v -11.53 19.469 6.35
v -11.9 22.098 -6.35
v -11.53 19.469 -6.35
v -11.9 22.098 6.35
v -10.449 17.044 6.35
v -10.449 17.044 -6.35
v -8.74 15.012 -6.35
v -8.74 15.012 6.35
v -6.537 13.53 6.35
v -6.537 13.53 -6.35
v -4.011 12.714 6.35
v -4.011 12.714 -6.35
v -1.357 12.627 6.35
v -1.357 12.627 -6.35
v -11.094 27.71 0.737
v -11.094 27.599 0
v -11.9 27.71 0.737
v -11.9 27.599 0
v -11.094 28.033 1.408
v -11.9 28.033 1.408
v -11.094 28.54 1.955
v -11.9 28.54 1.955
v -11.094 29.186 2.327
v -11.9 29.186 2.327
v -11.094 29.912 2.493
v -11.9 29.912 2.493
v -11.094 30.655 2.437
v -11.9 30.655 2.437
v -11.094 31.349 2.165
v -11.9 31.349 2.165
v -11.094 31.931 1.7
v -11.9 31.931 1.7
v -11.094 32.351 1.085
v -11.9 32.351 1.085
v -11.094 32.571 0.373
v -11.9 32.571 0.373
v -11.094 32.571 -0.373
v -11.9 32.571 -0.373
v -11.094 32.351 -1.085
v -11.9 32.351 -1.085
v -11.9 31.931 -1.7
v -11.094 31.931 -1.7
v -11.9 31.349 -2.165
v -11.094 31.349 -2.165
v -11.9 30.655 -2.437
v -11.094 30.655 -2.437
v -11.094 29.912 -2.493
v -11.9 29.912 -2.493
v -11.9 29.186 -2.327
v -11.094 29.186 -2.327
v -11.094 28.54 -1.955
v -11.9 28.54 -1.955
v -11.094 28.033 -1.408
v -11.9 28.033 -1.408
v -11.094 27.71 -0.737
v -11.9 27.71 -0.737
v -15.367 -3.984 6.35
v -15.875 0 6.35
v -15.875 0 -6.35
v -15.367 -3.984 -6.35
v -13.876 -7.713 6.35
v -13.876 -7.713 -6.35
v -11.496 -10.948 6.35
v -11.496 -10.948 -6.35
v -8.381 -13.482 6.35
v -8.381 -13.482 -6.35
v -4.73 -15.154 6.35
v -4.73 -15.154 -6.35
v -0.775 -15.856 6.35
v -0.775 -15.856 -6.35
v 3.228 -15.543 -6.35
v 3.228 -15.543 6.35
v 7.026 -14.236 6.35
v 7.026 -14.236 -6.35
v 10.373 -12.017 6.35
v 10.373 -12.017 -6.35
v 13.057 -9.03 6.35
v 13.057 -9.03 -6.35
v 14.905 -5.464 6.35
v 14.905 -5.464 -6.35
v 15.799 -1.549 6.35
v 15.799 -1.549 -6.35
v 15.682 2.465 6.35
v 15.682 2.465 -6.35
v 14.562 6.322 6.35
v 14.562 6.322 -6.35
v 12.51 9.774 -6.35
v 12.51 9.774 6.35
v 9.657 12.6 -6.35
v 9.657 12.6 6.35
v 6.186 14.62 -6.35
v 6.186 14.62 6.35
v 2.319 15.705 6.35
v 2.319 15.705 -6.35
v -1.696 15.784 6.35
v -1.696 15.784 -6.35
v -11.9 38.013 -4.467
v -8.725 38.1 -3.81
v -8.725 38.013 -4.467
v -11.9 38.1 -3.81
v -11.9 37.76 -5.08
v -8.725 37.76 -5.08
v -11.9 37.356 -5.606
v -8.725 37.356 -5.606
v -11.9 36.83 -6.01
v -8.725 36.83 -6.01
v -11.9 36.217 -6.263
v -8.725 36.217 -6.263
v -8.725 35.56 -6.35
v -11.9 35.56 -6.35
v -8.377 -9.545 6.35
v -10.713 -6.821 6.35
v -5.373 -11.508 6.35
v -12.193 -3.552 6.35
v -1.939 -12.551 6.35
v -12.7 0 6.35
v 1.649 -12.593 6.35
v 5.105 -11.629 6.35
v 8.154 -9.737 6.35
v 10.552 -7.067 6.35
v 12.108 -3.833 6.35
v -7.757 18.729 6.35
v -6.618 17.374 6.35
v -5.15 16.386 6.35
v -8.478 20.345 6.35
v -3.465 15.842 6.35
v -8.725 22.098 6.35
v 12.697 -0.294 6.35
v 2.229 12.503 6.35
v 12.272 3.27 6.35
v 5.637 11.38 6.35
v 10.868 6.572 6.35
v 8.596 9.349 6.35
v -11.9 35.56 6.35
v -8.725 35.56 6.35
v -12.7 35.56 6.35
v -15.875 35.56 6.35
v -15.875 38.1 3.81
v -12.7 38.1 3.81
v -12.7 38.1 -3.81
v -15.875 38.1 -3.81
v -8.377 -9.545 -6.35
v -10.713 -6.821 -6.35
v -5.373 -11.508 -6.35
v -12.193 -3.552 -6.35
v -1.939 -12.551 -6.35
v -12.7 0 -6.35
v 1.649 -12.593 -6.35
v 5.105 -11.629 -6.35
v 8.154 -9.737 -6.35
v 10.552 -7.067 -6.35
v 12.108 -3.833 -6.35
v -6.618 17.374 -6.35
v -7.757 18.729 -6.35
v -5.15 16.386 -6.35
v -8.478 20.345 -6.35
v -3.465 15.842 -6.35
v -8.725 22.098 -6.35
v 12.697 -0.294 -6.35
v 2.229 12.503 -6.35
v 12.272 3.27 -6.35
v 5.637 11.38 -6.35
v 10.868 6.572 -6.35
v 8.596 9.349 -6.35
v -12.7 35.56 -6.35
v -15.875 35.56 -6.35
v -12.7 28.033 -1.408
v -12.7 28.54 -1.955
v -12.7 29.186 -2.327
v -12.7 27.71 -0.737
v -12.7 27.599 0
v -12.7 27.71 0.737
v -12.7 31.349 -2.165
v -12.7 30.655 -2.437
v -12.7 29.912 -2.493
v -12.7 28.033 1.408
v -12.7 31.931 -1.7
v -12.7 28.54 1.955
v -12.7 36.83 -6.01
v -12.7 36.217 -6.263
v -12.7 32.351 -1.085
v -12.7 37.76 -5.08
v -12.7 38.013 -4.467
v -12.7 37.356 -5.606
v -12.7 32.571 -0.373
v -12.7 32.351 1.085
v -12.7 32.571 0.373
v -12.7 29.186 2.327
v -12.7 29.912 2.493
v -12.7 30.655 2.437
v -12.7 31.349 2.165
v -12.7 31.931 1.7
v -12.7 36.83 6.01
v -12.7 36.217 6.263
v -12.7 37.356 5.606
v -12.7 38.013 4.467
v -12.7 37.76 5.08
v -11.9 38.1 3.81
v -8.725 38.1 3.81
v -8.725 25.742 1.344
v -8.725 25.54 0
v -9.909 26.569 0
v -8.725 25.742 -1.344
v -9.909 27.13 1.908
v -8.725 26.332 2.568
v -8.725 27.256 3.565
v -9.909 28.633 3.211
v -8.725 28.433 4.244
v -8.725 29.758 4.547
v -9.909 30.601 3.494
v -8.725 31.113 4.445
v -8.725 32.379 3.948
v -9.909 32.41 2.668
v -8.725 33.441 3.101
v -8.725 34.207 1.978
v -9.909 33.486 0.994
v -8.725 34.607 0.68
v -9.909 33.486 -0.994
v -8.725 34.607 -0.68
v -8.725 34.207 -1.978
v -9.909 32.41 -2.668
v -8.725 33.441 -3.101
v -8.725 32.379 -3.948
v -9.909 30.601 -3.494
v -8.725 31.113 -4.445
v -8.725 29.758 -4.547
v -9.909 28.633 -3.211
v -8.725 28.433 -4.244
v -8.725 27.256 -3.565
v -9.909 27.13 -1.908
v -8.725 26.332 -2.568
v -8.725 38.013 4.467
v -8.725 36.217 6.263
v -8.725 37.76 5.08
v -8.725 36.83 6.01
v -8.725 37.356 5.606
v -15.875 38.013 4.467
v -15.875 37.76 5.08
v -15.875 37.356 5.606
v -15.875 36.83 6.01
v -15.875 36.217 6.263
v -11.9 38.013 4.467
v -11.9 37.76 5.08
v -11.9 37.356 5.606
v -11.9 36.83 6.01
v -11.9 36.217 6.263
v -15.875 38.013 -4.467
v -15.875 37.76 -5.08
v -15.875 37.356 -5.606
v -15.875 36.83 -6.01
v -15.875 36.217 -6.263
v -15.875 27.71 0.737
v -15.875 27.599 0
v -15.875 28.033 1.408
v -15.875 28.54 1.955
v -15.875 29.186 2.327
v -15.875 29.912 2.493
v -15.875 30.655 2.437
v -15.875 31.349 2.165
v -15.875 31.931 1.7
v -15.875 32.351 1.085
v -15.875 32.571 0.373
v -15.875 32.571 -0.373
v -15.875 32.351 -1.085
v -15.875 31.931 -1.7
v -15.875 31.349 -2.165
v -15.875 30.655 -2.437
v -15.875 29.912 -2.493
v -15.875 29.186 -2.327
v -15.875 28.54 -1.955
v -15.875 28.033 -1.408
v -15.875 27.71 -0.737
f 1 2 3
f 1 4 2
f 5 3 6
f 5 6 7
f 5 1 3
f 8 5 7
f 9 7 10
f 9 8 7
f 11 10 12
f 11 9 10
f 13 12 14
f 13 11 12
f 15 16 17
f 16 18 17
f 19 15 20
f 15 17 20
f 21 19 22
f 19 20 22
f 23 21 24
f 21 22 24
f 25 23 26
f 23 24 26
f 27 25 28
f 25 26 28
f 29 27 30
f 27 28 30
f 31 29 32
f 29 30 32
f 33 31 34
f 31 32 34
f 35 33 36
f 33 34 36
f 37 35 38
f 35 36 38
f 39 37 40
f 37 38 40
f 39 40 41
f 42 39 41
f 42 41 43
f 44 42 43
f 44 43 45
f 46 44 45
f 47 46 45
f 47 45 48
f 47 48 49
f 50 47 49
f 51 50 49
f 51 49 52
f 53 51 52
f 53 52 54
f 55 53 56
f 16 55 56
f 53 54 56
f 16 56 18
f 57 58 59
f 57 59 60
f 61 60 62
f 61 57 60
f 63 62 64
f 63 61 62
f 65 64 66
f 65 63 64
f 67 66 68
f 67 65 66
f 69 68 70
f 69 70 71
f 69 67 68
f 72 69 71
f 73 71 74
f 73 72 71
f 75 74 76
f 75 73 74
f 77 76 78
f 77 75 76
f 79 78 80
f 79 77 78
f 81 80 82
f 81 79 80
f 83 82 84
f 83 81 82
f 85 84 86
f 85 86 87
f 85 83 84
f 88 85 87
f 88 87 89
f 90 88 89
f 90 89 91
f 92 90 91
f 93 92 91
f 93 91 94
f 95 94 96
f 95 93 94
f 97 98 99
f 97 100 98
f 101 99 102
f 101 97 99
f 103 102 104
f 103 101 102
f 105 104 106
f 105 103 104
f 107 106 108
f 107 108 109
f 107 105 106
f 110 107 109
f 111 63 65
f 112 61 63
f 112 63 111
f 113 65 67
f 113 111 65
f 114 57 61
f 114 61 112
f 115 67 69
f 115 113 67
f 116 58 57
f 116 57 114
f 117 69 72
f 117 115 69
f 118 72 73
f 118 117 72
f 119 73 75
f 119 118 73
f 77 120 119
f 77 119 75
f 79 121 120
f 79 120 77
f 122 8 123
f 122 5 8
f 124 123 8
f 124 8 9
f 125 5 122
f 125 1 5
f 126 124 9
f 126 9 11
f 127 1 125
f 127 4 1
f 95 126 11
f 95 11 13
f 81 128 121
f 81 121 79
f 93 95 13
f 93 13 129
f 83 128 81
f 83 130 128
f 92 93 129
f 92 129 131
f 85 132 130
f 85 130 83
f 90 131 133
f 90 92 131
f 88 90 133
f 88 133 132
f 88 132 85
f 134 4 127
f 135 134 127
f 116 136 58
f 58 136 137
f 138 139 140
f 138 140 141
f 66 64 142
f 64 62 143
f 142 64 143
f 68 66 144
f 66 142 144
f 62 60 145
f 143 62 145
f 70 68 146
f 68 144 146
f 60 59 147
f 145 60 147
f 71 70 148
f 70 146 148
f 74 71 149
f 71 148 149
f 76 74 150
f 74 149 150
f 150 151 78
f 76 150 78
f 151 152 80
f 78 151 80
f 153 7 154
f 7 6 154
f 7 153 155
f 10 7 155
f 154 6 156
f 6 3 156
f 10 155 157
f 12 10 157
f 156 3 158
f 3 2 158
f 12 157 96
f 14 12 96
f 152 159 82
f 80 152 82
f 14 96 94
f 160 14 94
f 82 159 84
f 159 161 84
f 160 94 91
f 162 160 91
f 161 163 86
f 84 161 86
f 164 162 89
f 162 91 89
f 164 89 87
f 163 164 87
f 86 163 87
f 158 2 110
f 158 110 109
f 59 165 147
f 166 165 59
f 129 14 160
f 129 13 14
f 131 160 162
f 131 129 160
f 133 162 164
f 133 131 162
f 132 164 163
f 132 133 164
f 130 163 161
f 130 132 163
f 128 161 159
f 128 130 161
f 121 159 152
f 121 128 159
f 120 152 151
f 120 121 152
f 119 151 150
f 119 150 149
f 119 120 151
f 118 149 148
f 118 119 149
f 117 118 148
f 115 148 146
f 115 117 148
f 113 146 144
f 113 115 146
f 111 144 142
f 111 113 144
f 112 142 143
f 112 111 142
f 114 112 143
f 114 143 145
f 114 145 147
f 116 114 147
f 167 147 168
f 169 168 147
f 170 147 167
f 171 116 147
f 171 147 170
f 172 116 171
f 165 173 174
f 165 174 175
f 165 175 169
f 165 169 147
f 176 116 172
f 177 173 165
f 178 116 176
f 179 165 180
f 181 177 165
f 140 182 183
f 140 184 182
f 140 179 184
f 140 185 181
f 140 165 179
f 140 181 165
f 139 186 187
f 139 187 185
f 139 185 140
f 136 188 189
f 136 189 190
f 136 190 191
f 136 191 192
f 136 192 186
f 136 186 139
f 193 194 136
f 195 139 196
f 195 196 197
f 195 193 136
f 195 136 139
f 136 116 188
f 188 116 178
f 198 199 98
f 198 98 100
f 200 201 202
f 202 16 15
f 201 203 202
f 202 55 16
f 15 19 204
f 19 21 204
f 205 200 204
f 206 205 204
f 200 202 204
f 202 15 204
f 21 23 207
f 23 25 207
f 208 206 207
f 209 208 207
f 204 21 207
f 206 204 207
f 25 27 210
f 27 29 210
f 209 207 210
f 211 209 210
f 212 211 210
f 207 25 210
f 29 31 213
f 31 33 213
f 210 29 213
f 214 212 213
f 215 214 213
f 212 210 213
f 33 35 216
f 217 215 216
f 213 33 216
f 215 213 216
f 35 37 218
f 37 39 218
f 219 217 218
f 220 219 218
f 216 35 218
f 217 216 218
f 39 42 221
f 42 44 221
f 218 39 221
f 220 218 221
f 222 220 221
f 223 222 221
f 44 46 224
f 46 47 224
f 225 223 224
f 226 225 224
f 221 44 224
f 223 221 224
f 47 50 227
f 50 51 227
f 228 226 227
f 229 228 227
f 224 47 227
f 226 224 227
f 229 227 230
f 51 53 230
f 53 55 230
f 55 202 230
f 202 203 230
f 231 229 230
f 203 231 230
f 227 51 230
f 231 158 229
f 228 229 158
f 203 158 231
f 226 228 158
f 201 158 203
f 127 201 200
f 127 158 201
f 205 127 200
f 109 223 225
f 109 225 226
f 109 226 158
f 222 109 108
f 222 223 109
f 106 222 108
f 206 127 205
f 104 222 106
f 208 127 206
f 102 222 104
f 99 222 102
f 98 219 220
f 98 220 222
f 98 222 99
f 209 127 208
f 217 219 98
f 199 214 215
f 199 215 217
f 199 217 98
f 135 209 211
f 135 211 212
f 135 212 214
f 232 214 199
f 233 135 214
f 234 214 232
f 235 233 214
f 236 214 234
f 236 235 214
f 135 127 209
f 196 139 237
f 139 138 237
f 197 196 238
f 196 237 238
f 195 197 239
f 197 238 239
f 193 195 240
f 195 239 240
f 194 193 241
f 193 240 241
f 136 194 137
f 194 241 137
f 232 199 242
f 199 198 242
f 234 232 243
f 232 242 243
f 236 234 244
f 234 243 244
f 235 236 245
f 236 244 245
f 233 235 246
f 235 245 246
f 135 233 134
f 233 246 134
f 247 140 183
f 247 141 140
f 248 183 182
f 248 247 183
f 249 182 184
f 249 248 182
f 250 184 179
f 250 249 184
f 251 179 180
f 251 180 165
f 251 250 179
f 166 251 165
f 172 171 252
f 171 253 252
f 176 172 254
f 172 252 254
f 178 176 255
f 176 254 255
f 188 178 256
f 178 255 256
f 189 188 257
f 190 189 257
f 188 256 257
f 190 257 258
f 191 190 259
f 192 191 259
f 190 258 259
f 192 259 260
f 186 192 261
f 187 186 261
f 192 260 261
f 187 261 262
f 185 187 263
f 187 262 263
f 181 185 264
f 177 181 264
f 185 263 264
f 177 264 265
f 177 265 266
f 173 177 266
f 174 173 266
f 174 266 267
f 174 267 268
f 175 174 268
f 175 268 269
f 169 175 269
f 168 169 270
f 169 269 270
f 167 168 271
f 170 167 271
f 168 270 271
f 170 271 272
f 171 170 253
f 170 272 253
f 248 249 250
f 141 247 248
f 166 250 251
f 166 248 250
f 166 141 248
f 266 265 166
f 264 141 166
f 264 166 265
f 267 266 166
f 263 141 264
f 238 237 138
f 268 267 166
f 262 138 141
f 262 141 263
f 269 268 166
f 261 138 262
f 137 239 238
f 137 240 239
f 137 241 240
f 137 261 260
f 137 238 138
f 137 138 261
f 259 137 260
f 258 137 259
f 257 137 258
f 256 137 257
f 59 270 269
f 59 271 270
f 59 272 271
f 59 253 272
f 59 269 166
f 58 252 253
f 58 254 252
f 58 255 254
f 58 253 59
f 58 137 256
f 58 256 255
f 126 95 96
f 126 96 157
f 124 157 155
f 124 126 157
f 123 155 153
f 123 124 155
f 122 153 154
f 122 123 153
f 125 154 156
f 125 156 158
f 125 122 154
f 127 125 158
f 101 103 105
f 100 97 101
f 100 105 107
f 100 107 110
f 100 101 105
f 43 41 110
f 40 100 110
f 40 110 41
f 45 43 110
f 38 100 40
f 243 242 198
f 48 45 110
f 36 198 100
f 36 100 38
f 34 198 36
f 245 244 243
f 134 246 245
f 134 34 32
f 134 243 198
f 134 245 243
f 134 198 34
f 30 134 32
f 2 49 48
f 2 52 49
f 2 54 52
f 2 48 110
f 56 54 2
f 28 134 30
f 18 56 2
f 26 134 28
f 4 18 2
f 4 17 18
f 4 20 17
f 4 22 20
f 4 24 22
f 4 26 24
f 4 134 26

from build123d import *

# Parameters (mm, degrees)
F1_DEPTH       = 6.35
F3_D           = 5
F3_CSINK_D     = 9.1186
F3_CSINK_ANGLE = 82
F4_R           = 2.54


with BuildPart() as f1:
    # F0 (on Top) → F1 (new body, symmetric)
    with BuildSketch(Plane.XY):
        with BuildLine():
            ThreePointArc((-1.357143, 12.627279), (9.447902, -8.486881), (-12.7, 0))
            Line((-12.7, 0), (-12.7, 38.1))
            Line((-12.7, 38.1), (-15.875, 38.1))
            Line((-15.875, 38.1), (-15.875, 0))
            ThreePointArc((-15.875, 0), (11.809878, -10.608601), (-1.696429, 15.784098))
            ThreePointArc((-1.696429, 15.784098), (-6.61844, 17.373786), (-8.725, 22.097737))
            Line((-8.725, 22.097737), (-8.725, 38.1))
            Line((-8.725, 38.1), (-11.9, 38.1))
            Line((-11.9, 38.1), (-11.9, 22.097737))
            ThreePointArc((-11.9, 22.097737), (-8.74016, 15.011811), (-1.357143, 12.627279))
        make_face()
    extrude(amount=F1_DEPTH, both=True)

    # F3 (through all)
    with Locations(Plane.YZ.offset(-8.725)):
        with Locations((30.098869, 0)):
            CounterSinkHole(F3_D / 2, F3_CSINK_D / 2, counter_sink_angle=F3_CSINK_ANGLE)

    # F4
    f4_edges = [f1.edges().sort_by_distance(p)[0] for p in [
        (-14.2875, 38.1, 6.35),
        (-10.3125, 38.1, -6.35),
        (-14.2875, 38.1, -6.35),
        (-10.3125, 38.1, 6.35),
    ]]
    fillet(f4_edges, radius=F4_R)


solid = f1.part
